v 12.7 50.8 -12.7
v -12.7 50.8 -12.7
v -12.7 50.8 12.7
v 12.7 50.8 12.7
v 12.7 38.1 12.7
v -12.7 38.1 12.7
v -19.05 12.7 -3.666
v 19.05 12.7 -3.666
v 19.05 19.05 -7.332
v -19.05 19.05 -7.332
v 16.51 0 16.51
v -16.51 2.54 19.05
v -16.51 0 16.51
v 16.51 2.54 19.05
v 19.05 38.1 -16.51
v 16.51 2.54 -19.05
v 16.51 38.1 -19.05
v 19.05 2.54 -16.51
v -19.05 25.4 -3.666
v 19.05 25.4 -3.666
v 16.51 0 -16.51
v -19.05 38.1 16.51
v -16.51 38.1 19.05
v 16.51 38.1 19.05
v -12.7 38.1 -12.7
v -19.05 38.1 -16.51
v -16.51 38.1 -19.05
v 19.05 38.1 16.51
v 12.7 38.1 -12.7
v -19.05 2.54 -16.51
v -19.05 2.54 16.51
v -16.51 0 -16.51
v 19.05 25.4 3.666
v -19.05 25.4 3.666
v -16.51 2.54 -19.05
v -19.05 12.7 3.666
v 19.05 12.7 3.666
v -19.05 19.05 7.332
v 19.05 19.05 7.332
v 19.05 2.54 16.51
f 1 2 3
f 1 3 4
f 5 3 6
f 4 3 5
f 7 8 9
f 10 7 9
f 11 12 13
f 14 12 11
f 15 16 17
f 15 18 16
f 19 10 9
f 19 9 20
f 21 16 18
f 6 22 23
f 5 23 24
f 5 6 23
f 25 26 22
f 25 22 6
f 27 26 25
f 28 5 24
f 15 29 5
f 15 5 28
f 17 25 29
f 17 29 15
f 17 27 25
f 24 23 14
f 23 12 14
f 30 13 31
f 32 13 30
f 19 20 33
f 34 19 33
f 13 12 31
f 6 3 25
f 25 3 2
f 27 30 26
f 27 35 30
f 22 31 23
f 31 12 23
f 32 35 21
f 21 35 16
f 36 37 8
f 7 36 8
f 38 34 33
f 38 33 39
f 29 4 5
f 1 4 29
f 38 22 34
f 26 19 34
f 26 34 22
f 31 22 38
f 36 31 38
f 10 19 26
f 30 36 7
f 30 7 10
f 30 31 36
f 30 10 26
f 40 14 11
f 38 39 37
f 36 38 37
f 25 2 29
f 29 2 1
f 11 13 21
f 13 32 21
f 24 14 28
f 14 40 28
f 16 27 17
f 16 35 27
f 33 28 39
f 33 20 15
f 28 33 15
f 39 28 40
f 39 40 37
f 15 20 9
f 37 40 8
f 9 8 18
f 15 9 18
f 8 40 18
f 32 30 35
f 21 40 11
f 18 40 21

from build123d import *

# Parameters (mm, degrees)
SKETCH1_W           = 38.1
SKETCH1_H           = 38.1
BOSS_EXTRUDE1_DEPTH = 50.8
SKETCH2_W           = 38.1
SKETCH2_H           = 38.1
SKETCH2_W_2         = 25.4
SKETCH2_H_2         = 25.4
CUT_EXTRUDE1_DEPTH  = 12.7
CUT_EXTRUDE2_DEPTH  = 67.295946332
CHAMFER1_SIZE       = 2.54


with BuildPart() as part:
    # Sketch1 → Boss-Extrude1 (new body)
    with BuildSketch(Plane(origin=(0, 0, 0), x_dir=(1, 0, 0), z_dir=(0, 1, 0))):
        Rectangle(SKETCH1_W, SKETCH1_H)
    extrude(amount=BOSS_EXTRUDE1_DEPTH)

    # Sketch2 → Cut-Extrude1 (cut)
    with BuildSketch(Plane(origin=(0, 50.8, 0), x_dir=(1, 0, 0), z_dir=(0, 1, 0))):
        Rectangle(SKETCH2_W, SKETCH2_H)
        Rectangle(SKETCH2_W_2, SKETCH2_H_2, mode=Mode.SUBTRACT)
    extrude(amount=-CUT_EXTRUDE1_DEPTH, mode=Mode.SUBTRACT)

    # Sketch3 → Cut-Extrude2 (cut, through all)
    with BuildSketch(Plane(origin=(19.05, 0, 0), x_dir=(0, 0, -1), z_dir=(1, 0, 0))):
        Polygon((-7.332348419, 19.05), (-3.666174209, 12.7), (3.666174209, 12.7), (7.332348419, 19.05), (3.666174209, 25.4), (-3.666174209, 25.4), align=None)
    extrude(amount=-CUT_EXTRUDE2_DEPTH, mode=Mode.SUBTRACT)

    # Chamfer1
    chamfer1_edges = [part.edges().sort_by_distance(p)[0] for p in [
        (19.05, 19.05, 19.05),
        (-19.05, 19.05, 19.05),
        (-19.05, 19.05, -19.05),
        (19.05, 19.05, -19.05),
        (0, 0, 19.05),
        (-19.05, 0, 0),
        (0, 0, -19.05),
        (19.05, 0, 0),
    ]]
    chamfer(chamfer1_edges, length=CHAMFER1_SIZE)


solid = part.part
